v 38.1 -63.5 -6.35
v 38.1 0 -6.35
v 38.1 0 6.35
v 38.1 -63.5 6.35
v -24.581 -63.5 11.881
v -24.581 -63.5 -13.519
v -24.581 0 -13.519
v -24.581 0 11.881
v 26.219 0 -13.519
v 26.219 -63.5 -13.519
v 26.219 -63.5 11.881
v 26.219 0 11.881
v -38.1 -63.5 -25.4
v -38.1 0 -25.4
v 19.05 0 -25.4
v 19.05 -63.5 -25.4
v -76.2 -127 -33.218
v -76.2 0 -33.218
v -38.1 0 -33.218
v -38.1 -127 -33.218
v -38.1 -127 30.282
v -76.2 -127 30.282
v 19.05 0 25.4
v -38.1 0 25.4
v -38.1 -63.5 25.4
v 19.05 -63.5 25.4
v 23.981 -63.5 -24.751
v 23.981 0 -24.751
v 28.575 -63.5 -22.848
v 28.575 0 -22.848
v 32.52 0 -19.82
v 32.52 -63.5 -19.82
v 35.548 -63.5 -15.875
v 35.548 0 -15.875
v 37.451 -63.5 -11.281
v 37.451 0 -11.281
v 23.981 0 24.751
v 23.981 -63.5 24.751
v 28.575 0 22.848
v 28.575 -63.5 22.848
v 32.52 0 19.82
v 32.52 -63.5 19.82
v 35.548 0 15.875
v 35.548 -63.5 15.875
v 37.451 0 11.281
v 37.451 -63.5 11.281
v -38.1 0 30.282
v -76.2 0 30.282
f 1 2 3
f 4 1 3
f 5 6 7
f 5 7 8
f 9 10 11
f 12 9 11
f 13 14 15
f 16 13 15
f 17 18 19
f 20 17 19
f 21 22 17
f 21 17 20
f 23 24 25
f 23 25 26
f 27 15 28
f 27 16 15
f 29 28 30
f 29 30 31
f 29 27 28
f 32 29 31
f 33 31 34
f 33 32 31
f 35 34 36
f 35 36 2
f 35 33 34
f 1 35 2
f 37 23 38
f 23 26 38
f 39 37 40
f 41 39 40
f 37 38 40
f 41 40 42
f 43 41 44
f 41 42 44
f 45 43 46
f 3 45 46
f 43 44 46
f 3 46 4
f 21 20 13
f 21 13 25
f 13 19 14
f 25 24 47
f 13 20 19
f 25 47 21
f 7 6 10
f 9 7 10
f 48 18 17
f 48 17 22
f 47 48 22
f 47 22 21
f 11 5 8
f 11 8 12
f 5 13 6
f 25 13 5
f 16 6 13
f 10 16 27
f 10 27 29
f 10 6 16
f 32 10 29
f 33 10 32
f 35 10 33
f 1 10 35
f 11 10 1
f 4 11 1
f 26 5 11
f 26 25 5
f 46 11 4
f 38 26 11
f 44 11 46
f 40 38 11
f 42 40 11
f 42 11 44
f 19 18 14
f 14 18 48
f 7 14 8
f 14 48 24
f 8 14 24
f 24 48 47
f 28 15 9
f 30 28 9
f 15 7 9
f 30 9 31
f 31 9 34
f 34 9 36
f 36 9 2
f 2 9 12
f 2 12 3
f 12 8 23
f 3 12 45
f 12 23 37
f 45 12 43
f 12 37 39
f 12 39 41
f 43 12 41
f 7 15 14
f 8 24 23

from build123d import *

# Parameters (mm, degrees)
F0_W     = 76.2
F0_H     = 50.8
F0_W_2   = 50.8
F0_H_2   = 25.4
F1_DEPTH = 63.5
F2_R     = 19.05
F3_W     = 38.1
F3_H     = 63.5
F4_DEPTH = 127


with BuildPart() as f1:
    # F0 (on Front) → F1 (new body)
    with BuildSketch(Plane.XZ):
        Rectangle(F0_W, F0_H)
        with Locations((0.819354, -0.819356)):
            Rectangle(F0_W_2, F0_H_2, mode=Mode.SUBTRACT)
    extrude(amount=F1_DEPTH)

    # F2
    f2_edges = [f1.edges().sort_by_distance(p)[0] for p in [
        (38.1, -31.75, 25.4),
        (38.1, -31.75, -25.4),
    ]]
    fillet(f2_edges, radius=F2_R)

    # F3 (on Front) → F4 (join)
    with BuildSketch(Plane.XZ):
        with Locations((-57.149999, -1.467527)):
            Rectangle(F3_W, F3_H)
    extrude(amount=F4_DEPTH)


solid = f1.part
